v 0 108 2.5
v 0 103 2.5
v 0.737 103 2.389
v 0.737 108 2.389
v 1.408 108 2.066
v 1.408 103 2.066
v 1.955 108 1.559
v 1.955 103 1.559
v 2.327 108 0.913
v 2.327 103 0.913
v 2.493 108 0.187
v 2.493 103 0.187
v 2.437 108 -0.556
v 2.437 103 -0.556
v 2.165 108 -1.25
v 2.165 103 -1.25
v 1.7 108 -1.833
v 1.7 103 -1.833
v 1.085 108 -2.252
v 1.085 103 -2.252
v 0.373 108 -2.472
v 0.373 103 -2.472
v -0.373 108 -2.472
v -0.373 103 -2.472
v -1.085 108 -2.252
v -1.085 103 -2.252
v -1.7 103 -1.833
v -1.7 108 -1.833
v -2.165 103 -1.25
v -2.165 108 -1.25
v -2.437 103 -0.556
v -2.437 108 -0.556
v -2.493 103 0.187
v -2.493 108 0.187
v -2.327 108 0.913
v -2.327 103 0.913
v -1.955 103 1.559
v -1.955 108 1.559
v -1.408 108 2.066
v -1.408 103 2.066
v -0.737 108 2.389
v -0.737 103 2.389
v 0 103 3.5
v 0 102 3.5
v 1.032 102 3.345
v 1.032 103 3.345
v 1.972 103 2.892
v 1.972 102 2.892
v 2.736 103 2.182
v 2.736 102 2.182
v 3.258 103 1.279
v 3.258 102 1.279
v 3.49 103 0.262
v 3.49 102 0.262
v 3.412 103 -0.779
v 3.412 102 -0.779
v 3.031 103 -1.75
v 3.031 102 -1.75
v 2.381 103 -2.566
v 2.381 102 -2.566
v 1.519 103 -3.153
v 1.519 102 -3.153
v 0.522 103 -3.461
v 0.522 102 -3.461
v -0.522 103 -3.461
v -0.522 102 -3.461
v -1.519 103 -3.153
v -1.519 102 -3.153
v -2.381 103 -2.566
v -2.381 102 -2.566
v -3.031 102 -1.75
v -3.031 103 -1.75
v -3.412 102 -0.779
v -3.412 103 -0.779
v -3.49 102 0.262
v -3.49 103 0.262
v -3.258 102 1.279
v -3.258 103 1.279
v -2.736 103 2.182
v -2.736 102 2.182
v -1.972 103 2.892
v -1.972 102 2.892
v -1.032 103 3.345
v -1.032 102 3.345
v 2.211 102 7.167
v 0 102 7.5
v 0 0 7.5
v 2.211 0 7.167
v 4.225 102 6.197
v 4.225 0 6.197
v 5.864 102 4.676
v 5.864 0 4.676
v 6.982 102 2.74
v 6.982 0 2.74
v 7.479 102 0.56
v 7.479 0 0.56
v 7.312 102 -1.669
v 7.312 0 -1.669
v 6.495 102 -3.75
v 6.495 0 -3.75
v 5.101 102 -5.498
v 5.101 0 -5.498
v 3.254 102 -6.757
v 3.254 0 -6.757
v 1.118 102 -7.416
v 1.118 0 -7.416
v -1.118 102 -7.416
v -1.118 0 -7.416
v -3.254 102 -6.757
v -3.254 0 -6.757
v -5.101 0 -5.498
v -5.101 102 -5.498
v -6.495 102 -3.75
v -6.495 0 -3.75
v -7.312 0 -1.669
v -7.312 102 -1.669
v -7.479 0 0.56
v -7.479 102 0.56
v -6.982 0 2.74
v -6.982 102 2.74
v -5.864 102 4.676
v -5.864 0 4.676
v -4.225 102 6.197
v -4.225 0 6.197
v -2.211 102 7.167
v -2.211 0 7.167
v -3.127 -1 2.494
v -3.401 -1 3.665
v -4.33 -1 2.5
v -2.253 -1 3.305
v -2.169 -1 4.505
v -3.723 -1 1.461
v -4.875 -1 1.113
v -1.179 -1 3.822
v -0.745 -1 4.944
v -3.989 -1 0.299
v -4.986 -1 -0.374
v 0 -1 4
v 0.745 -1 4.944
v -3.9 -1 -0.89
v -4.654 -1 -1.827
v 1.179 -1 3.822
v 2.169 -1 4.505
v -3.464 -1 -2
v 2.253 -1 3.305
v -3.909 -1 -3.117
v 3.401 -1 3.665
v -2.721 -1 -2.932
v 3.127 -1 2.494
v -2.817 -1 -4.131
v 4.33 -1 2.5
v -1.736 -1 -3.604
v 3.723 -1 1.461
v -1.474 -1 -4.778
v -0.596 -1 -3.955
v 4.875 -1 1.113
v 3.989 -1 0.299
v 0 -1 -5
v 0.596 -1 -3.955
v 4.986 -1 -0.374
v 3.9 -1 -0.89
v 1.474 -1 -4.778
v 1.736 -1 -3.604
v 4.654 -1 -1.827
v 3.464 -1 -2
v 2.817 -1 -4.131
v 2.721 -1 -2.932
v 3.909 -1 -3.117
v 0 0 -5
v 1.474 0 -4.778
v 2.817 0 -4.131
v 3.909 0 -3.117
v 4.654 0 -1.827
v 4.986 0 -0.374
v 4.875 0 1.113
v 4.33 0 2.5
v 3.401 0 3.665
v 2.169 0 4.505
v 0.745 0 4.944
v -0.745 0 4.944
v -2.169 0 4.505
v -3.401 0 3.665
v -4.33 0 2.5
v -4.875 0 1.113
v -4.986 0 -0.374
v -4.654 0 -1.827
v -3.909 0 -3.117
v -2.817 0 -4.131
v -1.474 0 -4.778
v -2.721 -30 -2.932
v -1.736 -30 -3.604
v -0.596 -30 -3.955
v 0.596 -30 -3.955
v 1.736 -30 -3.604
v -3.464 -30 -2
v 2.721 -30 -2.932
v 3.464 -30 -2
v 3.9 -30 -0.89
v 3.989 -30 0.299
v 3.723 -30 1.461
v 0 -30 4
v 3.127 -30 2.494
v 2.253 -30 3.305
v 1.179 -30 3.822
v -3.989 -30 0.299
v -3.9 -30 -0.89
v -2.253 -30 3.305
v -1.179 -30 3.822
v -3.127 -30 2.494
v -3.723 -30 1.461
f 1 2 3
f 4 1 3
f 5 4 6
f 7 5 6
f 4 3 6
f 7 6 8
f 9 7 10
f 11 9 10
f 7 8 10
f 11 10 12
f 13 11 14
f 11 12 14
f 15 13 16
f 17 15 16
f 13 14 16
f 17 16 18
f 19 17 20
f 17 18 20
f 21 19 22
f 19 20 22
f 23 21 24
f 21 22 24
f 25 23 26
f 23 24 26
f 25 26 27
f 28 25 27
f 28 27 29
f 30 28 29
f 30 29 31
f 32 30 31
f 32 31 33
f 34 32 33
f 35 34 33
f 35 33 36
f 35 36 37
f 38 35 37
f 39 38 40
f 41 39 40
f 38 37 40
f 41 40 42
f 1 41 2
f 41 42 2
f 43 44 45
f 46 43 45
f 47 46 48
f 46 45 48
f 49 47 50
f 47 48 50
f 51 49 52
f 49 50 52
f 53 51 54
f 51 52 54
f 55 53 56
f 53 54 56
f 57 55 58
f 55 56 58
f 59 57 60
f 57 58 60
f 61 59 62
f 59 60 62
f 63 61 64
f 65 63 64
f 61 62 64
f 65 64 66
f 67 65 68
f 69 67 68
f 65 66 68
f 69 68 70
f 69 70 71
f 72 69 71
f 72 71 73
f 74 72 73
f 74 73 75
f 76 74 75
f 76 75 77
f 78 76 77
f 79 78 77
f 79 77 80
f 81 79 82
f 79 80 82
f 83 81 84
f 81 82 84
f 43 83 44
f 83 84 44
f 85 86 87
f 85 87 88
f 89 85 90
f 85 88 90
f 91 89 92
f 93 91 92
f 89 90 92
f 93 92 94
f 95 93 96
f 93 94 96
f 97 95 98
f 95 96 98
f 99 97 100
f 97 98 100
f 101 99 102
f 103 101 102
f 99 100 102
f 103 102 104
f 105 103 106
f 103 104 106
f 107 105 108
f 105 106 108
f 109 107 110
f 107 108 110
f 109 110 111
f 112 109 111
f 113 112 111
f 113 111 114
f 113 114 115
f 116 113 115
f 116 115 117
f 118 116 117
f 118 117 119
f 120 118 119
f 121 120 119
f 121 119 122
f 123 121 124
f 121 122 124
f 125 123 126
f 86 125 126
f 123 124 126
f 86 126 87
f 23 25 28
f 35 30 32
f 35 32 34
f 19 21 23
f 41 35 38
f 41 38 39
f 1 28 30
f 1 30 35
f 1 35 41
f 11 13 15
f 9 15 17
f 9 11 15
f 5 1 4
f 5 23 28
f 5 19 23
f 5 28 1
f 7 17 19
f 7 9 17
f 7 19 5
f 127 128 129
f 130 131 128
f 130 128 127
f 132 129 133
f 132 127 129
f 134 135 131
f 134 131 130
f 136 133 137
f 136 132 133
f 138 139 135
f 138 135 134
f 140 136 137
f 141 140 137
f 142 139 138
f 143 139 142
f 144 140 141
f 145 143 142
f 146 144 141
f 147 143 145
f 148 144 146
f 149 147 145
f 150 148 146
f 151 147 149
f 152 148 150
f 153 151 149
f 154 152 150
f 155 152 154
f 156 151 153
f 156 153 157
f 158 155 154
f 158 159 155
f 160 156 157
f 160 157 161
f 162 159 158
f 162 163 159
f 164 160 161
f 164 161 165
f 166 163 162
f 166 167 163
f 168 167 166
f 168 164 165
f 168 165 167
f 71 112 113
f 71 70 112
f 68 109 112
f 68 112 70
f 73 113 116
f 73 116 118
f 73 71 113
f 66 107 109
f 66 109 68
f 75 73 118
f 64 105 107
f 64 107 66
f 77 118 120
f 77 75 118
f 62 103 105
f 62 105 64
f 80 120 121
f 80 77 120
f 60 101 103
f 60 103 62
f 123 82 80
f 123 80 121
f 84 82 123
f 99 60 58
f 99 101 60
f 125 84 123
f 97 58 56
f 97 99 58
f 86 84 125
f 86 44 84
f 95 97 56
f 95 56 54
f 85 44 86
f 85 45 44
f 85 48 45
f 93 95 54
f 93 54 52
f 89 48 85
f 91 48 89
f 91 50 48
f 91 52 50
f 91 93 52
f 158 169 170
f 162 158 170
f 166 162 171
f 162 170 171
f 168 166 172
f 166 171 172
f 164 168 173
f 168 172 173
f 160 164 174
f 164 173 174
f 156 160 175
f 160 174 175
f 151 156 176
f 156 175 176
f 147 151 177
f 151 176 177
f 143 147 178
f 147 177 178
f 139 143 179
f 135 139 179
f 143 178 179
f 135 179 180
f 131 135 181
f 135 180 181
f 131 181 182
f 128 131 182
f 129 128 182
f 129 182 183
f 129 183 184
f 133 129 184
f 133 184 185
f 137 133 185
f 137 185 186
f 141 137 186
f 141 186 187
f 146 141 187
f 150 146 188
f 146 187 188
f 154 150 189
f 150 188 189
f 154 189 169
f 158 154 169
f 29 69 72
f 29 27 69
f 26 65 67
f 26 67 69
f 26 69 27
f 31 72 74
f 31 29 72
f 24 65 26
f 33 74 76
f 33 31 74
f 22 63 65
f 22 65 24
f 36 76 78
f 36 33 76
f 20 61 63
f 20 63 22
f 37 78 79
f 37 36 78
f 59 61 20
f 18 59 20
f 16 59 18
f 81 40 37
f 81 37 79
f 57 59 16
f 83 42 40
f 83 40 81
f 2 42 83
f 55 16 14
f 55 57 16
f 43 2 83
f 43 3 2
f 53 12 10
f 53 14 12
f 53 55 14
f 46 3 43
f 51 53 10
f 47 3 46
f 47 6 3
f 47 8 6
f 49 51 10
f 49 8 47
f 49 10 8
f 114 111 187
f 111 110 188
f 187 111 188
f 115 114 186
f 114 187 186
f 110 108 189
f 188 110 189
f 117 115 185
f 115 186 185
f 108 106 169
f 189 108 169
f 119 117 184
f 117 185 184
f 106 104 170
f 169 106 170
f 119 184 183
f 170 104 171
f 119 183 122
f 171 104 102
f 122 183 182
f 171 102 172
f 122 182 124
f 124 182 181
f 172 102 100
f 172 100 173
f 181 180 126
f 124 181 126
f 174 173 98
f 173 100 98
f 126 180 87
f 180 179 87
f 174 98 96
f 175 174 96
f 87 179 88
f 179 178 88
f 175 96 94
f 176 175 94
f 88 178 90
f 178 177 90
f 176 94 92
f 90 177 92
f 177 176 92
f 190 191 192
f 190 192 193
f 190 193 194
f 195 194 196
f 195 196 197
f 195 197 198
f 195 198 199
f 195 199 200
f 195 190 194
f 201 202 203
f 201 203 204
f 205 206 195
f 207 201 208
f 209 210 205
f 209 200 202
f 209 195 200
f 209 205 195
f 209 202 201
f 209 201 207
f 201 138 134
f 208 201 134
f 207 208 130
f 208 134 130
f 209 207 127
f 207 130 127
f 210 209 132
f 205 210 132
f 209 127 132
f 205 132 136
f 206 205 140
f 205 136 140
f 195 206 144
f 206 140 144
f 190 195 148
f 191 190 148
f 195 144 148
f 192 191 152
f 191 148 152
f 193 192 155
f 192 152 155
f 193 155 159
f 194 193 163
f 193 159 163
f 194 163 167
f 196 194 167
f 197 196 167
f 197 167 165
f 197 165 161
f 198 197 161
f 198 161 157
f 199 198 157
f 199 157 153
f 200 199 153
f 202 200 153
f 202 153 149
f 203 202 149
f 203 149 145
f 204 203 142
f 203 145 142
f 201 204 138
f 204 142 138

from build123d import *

# Parameters (mm, degrees)
SKETCH1_R           = 7.5
BOSS_EXTRUDE1_DEPTH = 102
SKETCH2_R           = 5
BOSS_EXTRUDE2_DEPTH = 1
SKETCH3_R           = 4
BOSS_EXTRUDE3_DEPTH = 29
SKETCH4_R           = 3.5
BOSS_EXTRUDE4_DEPTH = 1
SKETCH5_R           = 2.5
BOSS_EXTRUDE5_DEPTH = 5


with BuildPart() as part:
    # Sketch1 → Boss-Extrude1 (new body)
    with BuildSketch(Plane(origin=(0, 0, 0), x_dir=(1, 0, 0), z_dir=(0, 1, 0))):
        with Locations(Location((0, 0, 0), (0, 0, 270))):
            Circle(SKETCH1_R)
    extrude(amount=BOSS_EXTRUDE1_DEPTH)

    # Sketch2 → Boss-Extrude2 (add)
    with BuildSketch(Plane.XZ):
        with Locations(Location((0, 0, 0), (0, 0, 270))):
            Circle(SKETCH2_R)
    extrude(amount=BOSS_EXTRUDE2_DEPTH)

    # Sketch3 → Boss-Extrude3 (add)
    with BuildSketch(Plane.XZ.offset(1)):
        with Locations(Location((0, 0, 0), (0, 0, 90))):
            Circle(SKETCH3_R)
    extrude(amount=BOSS_EXTRUDE3_DEPTH)

    # Sketch4 → Boss-Extrude4 (add)
    with BuildSketch(Plane(origin=(0, 102, 0), x_dir=(1, 0, 0), z_dir=(0, 1, 0))):
        with Locations(Location((0, 0, 0), (0, 0, 270))):
            Circle(SKETCH4_R)
    extrude(amount=BOSS_EXTRUDE4_DEPTH)

    # Sketch5 → Boss-Extrude5 (add)
    with BuildSketch(Plane(origin=(0, 103, 0), x_dir=(1, 0, 0), z_dir=(0, 1, 0))):
        with Locations(Location((0, 0, 0), (0, 0, 270))):
            Circle(SKETCH5_R)
    extrude(amount=BOSS_EXTRUDE5_DEPTH)


solid = part.part
